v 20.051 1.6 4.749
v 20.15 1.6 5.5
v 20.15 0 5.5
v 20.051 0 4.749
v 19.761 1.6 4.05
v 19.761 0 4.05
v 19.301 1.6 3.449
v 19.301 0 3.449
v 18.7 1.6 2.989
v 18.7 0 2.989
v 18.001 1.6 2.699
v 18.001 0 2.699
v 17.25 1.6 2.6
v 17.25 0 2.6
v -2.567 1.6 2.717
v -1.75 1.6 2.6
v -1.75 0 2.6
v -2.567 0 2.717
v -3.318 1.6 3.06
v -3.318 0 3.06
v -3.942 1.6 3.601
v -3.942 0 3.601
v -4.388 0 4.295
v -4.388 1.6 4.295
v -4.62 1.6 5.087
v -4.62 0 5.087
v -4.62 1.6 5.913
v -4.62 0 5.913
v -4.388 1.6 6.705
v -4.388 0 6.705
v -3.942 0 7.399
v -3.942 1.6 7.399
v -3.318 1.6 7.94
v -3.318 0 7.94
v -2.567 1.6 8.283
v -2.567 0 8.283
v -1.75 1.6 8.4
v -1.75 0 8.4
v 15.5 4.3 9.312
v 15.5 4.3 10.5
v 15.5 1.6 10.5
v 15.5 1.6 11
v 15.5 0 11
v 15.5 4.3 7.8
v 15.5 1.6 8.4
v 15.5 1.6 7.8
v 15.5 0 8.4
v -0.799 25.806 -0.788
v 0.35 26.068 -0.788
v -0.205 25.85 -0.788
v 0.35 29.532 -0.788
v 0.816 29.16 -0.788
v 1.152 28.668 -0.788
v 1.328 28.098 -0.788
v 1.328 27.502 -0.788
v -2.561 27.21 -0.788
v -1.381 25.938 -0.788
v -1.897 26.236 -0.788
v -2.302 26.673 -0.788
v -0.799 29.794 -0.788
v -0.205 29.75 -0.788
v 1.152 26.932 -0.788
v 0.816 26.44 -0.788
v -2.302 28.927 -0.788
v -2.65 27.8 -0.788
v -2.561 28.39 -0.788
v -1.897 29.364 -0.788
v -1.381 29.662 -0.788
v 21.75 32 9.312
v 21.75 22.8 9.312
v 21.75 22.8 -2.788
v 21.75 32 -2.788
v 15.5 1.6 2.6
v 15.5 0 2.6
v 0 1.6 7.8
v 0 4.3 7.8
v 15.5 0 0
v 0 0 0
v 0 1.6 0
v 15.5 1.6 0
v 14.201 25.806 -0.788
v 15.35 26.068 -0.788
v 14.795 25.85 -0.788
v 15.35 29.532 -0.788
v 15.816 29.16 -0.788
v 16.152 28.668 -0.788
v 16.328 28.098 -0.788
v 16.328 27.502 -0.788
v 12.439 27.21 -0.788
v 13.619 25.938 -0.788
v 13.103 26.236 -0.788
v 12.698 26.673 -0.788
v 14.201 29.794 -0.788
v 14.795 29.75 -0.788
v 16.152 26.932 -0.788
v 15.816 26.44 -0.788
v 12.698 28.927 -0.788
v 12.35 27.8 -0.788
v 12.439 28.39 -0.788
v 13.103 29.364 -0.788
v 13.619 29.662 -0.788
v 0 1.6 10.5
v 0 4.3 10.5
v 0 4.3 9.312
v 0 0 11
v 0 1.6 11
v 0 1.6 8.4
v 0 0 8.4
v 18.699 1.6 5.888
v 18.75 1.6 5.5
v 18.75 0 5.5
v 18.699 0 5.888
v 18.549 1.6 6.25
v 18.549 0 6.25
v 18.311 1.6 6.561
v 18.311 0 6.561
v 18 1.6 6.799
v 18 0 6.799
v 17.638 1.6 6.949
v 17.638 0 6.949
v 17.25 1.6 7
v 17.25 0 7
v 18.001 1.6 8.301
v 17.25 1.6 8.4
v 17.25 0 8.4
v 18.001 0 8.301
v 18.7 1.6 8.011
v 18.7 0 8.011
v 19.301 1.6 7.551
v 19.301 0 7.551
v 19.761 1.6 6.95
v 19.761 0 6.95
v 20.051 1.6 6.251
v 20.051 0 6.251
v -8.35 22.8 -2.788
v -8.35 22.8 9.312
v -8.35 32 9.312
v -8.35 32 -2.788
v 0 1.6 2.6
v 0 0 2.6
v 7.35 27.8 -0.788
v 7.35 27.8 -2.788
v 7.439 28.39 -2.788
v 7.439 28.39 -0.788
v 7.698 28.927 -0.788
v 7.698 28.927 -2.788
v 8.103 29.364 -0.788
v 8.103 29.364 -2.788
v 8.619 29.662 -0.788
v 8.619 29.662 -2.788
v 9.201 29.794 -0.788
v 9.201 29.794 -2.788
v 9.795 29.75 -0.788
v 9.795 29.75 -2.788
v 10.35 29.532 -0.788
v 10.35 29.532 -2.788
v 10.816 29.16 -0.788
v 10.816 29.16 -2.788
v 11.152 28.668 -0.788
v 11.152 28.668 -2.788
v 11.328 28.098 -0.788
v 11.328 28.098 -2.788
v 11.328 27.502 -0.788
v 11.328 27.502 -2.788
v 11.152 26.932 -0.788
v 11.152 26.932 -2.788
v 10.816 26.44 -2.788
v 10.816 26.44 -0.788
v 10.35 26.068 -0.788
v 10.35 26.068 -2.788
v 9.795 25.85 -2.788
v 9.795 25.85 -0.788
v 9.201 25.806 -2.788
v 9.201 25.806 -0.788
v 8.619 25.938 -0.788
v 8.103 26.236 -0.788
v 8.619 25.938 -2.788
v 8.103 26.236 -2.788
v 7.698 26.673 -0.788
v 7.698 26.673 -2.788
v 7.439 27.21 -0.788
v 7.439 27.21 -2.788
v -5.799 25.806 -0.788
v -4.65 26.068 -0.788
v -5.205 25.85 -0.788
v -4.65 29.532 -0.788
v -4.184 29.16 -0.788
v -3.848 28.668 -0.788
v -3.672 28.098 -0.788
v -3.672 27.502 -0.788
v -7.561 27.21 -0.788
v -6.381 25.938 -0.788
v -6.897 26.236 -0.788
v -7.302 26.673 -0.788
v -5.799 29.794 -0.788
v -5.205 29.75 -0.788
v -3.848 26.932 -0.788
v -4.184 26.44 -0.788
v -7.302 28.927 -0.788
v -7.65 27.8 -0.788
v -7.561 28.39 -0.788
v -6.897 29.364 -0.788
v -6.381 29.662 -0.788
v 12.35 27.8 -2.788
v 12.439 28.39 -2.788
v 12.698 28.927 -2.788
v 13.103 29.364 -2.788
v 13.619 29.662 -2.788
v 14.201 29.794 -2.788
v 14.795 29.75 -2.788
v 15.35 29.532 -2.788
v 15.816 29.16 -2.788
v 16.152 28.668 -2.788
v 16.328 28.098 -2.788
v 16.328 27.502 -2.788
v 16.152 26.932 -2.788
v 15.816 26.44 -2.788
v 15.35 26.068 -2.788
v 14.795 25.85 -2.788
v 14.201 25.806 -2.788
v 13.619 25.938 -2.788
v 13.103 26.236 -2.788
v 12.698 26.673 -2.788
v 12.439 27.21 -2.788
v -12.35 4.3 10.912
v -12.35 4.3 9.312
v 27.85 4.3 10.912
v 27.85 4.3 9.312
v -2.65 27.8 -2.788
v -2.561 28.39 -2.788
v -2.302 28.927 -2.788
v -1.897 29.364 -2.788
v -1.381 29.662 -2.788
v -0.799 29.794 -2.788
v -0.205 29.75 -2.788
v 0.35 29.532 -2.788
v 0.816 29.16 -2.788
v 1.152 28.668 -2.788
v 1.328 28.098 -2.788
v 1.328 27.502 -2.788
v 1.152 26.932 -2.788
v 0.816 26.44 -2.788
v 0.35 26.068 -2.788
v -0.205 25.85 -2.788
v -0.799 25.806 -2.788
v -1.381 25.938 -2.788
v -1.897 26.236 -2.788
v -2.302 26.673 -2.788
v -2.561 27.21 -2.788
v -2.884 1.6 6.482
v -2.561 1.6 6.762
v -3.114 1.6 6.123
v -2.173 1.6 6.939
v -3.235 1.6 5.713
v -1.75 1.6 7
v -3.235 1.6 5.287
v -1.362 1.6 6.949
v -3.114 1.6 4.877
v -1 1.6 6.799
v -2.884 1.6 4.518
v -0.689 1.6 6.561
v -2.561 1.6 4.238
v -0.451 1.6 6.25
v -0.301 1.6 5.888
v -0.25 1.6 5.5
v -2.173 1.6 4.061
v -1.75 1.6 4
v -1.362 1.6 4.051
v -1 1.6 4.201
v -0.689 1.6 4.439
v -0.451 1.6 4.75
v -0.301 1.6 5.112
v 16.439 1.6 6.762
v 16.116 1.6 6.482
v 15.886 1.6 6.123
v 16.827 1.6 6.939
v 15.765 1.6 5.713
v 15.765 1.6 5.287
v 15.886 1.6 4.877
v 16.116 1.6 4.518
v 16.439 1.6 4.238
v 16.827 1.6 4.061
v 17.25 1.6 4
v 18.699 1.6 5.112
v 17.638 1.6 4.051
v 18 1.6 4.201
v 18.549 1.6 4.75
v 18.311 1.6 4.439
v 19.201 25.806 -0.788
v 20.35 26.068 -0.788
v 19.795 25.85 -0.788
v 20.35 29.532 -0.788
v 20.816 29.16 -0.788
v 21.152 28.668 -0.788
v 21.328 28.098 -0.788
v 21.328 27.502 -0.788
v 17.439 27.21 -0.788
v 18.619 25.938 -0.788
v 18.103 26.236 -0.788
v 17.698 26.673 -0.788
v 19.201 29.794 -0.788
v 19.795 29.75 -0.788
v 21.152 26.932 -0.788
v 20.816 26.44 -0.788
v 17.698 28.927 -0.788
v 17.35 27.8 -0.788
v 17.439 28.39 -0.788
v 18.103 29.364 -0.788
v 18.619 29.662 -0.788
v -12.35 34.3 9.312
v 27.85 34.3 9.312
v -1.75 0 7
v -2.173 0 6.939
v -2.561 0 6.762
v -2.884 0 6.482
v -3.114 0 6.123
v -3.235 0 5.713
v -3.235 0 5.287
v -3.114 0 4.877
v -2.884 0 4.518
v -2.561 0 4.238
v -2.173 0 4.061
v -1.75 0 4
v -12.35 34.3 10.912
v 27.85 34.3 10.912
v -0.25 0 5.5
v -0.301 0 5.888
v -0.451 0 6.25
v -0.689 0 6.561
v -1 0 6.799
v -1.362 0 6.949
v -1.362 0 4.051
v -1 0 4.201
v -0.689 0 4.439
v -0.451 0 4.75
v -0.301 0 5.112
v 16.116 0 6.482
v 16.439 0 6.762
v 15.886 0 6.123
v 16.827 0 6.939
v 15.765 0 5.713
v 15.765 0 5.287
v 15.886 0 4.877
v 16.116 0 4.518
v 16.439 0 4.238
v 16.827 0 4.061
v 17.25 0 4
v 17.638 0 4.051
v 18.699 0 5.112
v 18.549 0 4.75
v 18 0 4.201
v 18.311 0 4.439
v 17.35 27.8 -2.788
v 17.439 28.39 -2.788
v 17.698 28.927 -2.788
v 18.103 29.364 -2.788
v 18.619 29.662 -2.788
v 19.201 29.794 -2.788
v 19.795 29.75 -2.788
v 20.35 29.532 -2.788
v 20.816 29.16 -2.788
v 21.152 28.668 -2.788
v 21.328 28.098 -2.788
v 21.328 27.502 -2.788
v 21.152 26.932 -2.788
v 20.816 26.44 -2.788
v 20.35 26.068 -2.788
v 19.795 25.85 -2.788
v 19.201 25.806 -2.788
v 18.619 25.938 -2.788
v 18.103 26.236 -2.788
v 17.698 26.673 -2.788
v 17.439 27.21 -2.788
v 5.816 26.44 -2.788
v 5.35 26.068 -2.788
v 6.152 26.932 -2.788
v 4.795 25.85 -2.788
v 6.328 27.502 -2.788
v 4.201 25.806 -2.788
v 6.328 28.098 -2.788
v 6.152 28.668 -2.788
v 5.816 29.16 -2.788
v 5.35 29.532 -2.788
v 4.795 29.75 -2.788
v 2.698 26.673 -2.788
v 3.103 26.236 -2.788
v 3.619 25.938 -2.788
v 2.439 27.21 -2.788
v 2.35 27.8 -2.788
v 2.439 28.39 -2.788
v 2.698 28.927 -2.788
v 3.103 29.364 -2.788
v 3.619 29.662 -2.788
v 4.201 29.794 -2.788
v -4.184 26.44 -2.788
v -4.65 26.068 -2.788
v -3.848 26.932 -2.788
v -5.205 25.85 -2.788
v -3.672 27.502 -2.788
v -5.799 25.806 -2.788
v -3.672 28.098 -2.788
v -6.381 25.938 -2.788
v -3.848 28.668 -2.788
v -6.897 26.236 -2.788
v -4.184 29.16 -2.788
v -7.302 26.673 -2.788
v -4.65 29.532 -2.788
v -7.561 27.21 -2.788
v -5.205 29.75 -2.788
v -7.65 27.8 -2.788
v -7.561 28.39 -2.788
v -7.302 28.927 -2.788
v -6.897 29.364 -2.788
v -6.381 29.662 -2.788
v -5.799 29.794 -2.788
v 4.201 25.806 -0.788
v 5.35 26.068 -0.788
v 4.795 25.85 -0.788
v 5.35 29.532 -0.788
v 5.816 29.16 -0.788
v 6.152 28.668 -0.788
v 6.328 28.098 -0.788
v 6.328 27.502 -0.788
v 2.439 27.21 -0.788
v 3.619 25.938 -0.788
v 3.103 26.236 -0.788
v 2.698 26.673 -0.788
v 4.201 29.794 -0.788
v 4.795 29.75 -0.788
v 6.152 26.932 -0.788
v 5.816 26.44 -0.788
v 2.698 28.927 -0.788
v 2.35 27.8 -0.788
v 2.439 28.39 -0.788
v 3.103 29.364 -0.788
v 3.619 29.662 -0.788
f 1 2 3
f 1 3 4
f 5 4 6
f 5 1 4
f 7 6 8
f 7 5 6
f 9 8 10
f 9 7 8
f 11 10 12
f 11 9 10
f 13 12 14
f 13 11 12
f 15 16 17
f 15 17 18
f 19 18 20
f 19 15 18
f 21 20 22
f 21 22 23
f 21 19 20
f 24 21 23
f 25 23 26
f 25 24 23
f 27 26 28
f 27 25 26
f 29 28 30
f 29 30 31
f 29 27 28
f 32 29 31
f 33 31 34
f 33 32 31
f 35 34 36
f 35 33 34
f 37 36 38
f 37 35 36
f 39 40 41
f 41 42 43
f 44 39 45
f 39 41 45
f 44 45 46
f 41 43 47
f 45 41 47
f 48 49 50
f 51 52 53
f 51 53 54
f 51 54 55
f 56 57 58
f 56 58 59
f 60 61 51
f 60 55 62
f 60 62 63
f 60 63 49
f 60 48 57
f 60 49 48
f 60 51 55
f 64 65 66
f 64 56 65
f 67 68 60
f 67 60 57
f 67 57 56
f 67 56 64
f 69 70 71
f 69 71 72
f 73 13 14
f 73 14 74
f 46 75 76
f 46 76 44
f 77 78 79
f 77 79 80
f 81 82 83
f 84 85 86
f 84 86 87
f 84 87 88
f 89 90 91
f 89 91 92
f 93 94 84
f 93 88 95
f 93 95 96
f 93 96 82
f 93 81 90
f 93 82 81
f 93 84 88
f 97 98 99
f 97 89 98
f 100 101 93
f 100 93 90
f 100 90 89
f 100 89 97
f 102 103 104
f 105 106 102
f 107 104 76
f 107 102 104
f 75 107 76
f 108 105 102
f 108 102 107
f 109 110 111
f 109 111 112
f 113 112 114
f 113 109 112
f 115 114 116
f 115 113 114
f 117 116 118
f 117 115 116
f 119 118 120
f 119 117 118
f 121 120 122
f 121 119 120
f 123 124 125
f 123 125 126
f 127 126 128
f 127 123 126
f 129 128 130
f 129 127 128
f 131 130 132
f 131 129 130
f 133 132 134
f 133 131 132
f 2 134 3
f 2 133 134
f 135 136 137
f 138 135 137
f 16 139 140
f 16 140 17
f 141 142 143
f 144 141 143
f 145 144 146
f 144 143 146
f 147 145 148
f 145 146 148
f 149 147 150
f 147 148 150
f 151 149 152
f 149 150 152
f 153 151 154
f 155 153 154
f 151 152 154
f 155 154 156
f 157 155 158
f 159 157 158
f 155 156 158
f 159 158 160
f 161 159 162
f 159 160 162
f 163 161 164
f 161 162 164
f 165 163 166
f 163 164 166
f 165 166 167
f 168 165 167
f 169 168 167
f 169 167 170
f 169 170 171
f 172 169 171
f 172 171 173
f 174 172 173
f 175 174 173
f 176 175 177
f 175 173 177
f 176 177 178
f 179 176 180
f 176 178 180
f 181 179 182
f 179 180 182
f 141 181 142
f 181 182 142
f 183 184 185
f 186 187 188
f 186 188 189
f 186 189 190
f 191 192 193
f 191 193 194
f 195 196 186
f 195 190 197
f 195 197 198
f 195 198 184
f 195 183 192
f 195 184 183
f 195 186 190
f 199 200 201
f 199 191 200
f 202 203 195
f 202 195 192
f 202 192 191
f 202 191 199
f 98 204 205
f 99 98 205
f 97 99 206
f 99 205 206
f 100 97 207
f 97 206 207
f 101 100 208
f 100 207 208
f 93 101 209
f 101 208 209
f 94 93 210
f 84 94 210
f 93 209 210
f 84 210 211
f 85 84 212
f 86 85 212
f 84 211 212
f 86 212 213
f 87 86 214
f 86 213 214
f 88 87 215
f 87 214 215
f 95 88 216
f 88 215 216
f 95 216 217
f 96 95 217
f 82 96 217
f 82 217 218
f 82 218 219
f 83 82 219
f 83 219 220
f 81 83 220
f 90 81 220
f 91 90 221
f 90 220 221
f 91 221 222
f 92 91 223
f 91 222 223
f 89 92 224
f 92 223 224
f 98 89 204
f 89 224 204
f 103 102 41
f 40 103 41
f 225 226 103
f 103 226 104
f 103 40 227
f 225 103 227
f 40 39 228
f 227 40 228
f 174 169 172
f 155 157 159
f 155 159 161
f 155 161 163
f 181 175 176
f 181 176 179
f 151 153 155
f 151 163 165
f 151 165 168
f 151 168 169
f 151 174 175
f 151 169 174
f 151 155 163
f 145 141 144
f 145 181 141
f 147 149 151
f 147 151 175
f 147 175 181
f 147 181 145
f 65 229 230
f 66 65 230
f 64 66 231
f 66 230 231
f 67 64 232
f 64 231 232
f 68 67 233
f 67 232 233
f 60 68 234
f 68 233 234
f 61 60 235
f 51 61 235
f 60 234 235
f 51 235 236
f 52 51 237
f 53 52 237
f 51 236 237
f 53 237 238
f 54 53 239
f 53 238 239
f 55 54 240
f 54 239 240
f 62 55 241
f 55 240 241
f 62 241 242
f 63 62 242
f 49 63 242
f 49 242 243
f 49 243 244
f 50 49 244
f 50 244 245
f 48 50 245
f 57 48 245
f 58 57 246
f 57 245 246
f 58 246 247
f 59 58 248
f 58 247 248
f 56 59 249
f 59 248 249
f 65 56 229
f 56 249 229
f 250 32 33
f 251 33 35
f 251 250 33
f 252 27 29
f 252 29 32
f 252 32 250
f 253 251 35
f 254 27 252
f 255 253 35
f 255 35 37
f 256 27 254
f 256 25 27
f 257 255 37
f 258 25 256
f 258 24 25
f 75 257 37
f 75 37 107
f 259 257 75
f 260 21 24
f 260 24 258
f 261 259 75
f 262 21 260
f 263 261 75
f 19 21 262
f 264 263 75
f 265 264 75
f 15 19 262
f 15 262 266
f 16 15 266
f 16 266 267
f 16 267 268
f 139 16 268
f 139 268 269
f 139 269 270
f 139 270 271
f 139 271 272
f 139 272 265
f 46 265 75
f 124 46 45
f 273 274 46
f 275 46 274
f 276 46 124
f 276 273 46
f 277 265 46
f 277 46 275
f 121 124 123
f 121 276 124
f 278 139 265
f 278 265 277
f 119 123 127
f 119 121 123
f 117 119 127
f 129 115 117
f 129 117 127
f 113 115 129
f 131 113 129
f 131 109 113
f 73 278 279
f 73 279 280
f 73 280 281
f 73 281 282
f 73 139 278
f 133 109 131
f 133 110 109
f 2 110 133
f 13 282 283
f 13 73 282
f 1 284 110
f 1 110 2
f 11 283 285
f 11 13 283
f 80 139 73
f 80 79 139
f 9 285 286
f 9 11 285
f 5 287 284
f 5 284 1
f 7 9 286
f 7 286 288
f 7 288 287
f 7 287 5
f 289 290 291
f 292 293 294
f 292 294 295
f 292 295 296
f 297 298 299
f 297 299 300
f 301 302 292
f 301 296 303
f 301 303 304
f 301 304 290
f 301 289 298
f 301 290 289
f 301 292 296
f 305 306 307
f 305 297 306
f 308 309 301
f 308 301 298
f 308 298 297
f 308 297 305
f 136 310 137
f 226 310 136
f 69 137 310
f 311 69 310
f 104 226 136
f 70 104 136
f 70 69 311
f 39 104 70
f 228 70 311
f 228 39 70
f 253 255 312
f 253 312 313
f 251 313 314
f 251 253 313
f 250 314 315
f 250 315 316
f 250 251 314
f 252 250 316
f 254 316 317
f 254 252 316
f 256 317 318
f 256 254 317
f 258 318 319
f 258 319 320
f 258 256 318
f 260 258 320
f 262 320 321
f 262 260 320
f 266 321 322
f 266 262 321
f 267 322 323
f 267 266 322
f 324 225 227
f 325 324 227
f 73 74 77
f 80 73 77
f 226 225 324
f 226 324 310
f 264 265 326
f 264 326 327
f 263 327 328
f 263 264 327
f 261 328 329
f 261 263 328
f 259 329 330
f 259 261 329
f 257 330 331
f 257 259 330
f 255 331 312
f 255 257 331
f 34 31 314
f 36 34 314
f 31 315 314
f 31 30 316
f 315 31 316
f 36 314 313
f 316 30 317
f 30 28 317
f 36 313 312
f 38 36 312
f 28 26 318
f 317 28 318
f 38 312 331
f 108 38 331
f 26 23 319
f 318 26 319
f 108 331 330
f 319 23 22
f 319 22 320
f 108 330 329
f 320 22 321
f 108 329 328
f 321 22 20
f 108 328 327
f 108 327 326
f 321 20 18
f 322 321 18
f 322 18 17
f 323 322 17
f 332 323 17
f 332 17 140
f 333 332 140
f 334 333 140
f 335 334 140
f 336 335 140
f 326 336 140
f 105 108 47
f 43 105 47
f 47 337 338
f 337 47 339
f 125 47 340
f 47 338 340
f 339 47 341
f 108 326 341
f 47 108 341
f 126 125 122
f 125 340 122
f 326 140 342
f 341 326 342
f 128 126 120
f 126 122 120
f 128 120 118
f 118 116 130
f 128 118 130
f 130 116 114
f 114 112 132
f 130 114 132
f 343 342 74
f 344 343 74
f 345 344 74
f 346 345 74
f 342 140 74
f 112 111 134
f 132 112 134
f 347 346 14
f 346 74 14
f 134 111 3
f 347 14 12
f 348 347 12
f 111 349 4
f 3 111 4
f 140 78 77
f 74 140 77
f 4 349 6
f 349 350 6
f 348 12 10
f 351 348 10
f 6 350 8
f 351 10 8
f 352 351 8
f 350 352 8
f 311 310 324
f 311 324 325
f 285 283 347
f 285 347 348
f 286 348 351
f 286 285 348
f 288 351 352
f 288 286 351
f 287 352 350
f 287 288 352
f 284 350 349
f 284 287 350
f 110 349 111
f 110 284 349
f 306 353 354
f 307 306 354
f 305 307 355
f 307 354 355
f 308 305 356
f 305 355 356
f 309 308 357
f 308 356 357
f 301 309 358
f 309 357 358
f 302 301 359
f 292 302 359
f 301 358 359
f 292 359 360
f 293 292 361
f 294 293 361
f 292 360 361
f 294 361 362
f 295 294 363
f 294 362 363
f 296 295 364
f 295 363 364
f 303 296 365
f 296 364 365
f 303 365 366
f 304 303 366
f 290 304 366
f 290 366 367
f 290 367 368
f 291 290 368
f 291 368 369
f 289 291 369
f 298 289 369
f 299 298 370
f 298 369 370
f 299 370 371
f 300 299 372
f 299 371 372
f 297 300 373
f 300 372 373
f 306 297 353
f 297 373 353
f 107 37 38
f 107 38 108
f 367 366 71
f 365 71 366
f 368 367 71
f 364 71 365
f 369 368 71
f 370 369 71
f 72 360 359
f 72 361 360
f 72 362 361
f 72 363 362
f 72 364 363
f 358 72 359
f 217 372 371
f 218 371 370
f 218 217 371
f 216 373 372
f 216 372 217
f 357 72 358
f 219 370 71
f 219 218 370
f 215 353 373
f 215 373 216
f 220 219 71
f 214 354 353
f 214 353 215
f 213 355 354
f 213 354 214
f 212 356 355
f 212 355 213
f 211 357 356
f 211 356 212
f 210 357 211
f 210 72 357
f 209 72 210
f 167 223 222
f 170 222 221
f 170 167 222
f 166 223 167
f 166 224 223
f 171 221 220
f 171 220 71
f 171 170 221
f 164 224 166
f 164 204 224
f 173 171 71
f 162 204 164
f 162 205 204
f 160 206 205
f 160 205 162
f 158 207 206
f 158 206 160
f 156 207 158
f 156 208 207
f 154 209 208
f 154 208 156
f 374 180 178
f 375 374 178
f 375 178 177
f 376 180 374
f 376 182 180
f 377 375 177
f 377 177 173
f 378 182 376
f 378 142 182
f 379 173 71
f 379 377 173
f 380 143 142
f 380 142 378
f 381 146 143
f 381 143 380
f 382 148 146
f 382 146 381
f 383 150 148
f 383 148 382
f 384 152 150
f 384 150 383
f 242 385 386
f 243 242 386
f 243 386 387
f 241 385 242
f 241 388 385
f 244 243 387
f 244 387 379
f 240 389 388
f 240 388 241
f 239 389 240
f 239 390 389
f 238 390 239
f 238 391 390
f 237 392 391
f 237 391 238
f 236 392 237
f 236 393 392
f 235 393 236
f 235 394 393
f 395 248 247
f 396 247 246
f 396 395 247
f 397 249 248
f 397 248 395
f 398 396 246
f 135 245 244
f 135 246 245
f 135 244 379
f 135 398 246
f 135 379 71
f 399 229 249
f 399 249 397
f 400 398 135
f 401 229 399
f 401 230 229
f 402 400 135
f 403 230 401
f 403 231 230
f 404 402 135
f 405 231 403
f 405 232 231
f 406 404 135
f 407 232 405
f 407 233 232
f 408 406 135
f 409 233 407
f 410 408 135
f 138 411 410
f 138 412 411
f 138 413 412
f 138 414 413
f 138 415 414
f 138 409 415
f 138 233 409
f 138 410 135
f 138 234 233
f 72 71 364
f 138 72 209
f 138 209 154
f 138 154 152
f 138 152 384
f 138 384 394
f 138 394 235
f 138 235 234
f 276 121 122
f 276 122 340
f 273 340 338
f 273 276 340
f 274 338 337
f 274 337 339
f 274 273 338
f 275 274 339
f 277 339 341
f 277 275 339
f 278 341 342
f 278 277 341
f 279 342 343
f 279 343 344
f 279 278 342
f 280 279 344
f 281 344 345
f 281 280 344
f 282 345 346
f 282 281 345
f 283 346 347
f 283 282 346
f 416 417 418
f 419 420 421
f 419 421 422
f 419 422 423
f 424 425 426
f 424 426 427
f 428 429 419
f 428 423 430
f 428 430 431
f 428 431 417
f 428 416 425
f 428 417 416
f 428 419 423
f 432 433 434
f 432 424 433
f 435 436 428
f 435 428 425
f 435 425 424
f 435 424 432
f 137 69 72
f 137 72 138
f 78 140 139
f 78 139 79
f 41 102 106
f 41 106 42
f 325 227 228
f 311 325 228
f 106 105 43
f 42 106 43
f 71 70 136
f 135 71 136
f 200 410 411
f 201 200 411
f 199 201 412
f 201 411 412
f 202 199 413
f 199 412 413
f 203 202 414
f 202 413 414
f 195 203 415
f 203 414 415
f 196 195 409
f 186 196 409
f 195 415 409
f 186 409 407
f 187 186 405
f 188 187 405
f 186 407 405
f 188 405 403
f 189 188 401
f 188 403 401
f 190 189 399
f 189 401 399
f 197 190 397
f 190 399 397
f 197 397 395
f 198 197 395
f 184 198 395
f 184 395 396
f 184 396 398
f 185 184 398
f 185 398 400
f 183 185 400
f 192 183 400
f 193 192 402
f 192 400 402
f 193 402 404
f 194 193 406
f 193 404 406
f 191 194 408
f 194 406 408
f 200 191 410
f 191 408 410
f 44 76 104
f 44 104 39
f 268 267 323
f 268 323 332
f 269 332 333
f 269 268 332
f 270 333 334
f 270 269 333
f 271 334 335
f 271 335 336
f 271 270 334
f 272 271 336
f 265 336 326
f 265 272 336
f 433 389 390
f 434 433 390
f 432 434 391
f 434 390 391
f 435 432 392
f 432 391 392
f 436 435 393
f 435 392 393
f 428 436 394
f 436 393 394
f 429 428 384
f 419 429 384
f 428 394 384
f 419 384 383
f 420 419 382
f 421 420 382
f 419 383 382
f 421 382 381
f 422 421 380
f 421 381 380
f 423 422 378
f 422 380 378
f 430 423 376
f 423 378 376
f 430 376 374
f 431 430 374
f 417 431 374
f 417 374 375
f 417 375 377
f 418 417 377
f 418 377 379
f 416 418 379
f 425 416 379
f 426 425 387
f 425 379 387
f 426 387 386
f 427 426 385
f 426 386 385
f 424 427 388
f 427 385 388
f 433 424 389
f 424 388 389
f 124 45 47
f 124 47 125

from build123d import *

# Parameters (mm, degrees)
SKETCH1_W           = 15.5
SKETCH1_H           = 11
BOSS_EXTRUDE1_DEPTH = 1.6
BOSS_EXTRUDE2_DEPTH = 1.6
SKETCH3_W           = 15.5
SKETCH3_H           = 2.7
BOSS_EXTRUDE3_DEPTH = 2.7
SKETCH4_W           = 40.2
SKETCH4_H           = 1.6
BOSS_EXTRUDE4_DEPTH = 30
SKETCH5_W           = 30.1
SKETCH5_H           = 9.2
BOSS_EXTRUDE5_DEPTH = 12.1
SKETCH6_R           = 2
CUT_EXTRUDE1_DEPTH  = 2
LPATTERN1_COUNT     = 6
LPATTERN1_PITCH     = 5


with BuildPart() as part:
    # Sketch1 → Boss-Extrude1 (new body)
    with BuildSketch(Plane(origin=(0, 0, 0), x_dir=(1, 0, 0), z_dir=(0, 1, 0))):
        with Locations((7.75, -5.5)):
            Rectangle(SKETCH1_W, SKETCH1_H)
    extrude(amount=BOSS_EXTRUDE1_DEPTH)

    # Sketch2 → Boss-Extrude2 (add, through all)
    with BuildSketch(Plane(origin=(0, 1.6, 0), x_dir=(1, 0, 0), z_dir=(0, 1, 0))):
        with BuildLine():
            Line((-1.75, -4), (-1.75, -2.6))
            ThreePointArc((-1.75, -2.6), (-4.65, -5.5), (-1.75, -8.4))
            Line((-1.75, -8.4), (-1.75, -7))
            ThreePointArc((-1.75, -7), (-3.25, -5.5), (-1.75, -4))
        make_face()
        with BuildLine():
            ThreePointArc((0, -3.187533784), (-0.827002716, -2.750804479), (-1.75, -2.6))
            Line((-1.75, -2.6), (-1.75, -4))
            ThreePointArc((-1.75, -4), (-0.689339828, -4.439339828), (-0.25, -5.5))
            ThreePointArc((-0.25, -5.5), (-0.689339828, -6.560660172), (-1.75, -7))
            Line((-1.75, -7), (-1.75, -8.4))
            ThreePointArc((-1.75, -8.4), (-0.827002716, -8.249195521), (0, -7.812466216))
            Line((0, -7.812466216), (0, -3.187533784))
        make_face()
        with BuildLine():
            Line((0, -2.6), (-1.75, -2.6))
            ThreePointArc((-1.75, -2.6), (-0.827002716, -2.750804479), (0, -3.187533784))
            Line((0, -3.187533784), (0, -2.6))
        make_face()
        with BuildLine():
            ThreePointArc((0, -7.812466216), (-0.827002716, -8.249195521), (-1.75, -8.4))
            Line((-1.75, -8.4), (0, -8.4))
            Line((0, -8.4), (0, -7.812466216))
        make_face()
        with BuildLine():
            ThreePointArc((20.15, -5.5), (19.300609665, -3.449390335), (17.25, -2.6))
            Line((17.25, -2.6), (17.25, -4))
            ThreePointArc((17.25, -4), (18.310660172, -4.439339828), (18.75, -5.5))
            ThreePointArc((18.75, -5.5), (18.310660172, -6.560660172), (17.25, -7))
            Line((17.25, -7), (17.25, -8.4))
            ThreePointArc((17.25, -8.4), (19.300609665, -7.550609665), (20.15, -5.5))
        make_face()
        with BuildLine():
            Line((17.25, -4), (17.25, -2.6))
            ThreePointArc((17.25, -2.6), (16.327002716, -2.750804479), (15.5, -3.187533784))
            Line((15.5, -3.187533784), (15.5, -7.812466216))
            ThreePointArc((15.5, -7.812466216), (16.327002716, -8.249195521), (17.25, -8.4))
            Line((17.25, -8.4), (17.25, -7))
            ThreePointArc((17.25, -7), (15.75, -5.5), (17.25, -4))
        make_face()
        with BuildLine():
            Line((17.25, -2.6), (15.5, -2.6))
            Line((15.5, -2.6), (15.5, -3.187533784))
            ThreePointArc((15.5, -3.187533784), (16.327002716, -2.750804479), (17.25, -2.6))
        make_face()
        with BuildLine():
            Line((15.5, -7.812466216), (15.5, -8.4))
            Line((15.5, -8.4), (17.25, -8.4))
            ThreePointArc((17.25, -8.4), (16.327002716, -8.249195521), (15.5, -7.812466216))
        make_face()
    extrude(amount=-BOSS_EXTRUDE2_DEPTH)

    # Sketch3 → Boss-Extrude3 (add)
    with BuildSketch(Plane(origin=(0, 1.6, 0), x_dir=(1, 0, 0), z_dir=(0, 1, 0))):
        with Locations((7.75, -9.15)):
            Rectangle(SKETCH3_W, SKETCH3_H)
    extrude(amount=BOSS_EXTRUDE3_DEPTH)

    # Sketch4 → Boss-Extrude4 (add)
    with BuildSketch(Plane(origin=(0, 4.3, 0), x_dir=(1, 0, 0), z_dir=(0, 1, 0))):
        with Locations((7.75, -10.112281479)):
            Rectangle(SKETCH4_W, SKETCH4_H)
    extrude(amount=BOSS_EXTRUDE4_DEPTH)

    # Sketch5 → Boss-Extrude5 (add)
    with BuildSketch(Plane(origin=(0, 0, 9.312281479), x_dir=(-1, 0, 0), z_dir=(0, 0, -1))):
        with Locations((-6.7, 27.4)):
            Rectangle(SKETCH5_W, SKETCH5_H)
    extrude(amount=BOSS_EXTRUDE5_DEPTH)

    # Sketch6 → Cut-Extrude1 (cut)
    with BuildSketch(Plane(origin=(0, 0, -2.787718521), x_dir=(-1, 0, 0), z_dir=(0, 0, -1))):
        with Locations((-19.35, 27.8)):
            Circle(SKETCH6_R)
    cut_extrude1 = extrude(amount=-CUT_EXTRUDE1_DEPTH, mode=Mode.SUBTRACT)

    # LPattern1: Cut-Extrude1 ×6
    with Locations(*[(-i * LPATTERN1_PITCH, 0, 0) for i in range(1, LPATTERN1_COUNT)]):
        add(cut_extrude1, mode=Mode.SUBTRACT)


solid = part.part
